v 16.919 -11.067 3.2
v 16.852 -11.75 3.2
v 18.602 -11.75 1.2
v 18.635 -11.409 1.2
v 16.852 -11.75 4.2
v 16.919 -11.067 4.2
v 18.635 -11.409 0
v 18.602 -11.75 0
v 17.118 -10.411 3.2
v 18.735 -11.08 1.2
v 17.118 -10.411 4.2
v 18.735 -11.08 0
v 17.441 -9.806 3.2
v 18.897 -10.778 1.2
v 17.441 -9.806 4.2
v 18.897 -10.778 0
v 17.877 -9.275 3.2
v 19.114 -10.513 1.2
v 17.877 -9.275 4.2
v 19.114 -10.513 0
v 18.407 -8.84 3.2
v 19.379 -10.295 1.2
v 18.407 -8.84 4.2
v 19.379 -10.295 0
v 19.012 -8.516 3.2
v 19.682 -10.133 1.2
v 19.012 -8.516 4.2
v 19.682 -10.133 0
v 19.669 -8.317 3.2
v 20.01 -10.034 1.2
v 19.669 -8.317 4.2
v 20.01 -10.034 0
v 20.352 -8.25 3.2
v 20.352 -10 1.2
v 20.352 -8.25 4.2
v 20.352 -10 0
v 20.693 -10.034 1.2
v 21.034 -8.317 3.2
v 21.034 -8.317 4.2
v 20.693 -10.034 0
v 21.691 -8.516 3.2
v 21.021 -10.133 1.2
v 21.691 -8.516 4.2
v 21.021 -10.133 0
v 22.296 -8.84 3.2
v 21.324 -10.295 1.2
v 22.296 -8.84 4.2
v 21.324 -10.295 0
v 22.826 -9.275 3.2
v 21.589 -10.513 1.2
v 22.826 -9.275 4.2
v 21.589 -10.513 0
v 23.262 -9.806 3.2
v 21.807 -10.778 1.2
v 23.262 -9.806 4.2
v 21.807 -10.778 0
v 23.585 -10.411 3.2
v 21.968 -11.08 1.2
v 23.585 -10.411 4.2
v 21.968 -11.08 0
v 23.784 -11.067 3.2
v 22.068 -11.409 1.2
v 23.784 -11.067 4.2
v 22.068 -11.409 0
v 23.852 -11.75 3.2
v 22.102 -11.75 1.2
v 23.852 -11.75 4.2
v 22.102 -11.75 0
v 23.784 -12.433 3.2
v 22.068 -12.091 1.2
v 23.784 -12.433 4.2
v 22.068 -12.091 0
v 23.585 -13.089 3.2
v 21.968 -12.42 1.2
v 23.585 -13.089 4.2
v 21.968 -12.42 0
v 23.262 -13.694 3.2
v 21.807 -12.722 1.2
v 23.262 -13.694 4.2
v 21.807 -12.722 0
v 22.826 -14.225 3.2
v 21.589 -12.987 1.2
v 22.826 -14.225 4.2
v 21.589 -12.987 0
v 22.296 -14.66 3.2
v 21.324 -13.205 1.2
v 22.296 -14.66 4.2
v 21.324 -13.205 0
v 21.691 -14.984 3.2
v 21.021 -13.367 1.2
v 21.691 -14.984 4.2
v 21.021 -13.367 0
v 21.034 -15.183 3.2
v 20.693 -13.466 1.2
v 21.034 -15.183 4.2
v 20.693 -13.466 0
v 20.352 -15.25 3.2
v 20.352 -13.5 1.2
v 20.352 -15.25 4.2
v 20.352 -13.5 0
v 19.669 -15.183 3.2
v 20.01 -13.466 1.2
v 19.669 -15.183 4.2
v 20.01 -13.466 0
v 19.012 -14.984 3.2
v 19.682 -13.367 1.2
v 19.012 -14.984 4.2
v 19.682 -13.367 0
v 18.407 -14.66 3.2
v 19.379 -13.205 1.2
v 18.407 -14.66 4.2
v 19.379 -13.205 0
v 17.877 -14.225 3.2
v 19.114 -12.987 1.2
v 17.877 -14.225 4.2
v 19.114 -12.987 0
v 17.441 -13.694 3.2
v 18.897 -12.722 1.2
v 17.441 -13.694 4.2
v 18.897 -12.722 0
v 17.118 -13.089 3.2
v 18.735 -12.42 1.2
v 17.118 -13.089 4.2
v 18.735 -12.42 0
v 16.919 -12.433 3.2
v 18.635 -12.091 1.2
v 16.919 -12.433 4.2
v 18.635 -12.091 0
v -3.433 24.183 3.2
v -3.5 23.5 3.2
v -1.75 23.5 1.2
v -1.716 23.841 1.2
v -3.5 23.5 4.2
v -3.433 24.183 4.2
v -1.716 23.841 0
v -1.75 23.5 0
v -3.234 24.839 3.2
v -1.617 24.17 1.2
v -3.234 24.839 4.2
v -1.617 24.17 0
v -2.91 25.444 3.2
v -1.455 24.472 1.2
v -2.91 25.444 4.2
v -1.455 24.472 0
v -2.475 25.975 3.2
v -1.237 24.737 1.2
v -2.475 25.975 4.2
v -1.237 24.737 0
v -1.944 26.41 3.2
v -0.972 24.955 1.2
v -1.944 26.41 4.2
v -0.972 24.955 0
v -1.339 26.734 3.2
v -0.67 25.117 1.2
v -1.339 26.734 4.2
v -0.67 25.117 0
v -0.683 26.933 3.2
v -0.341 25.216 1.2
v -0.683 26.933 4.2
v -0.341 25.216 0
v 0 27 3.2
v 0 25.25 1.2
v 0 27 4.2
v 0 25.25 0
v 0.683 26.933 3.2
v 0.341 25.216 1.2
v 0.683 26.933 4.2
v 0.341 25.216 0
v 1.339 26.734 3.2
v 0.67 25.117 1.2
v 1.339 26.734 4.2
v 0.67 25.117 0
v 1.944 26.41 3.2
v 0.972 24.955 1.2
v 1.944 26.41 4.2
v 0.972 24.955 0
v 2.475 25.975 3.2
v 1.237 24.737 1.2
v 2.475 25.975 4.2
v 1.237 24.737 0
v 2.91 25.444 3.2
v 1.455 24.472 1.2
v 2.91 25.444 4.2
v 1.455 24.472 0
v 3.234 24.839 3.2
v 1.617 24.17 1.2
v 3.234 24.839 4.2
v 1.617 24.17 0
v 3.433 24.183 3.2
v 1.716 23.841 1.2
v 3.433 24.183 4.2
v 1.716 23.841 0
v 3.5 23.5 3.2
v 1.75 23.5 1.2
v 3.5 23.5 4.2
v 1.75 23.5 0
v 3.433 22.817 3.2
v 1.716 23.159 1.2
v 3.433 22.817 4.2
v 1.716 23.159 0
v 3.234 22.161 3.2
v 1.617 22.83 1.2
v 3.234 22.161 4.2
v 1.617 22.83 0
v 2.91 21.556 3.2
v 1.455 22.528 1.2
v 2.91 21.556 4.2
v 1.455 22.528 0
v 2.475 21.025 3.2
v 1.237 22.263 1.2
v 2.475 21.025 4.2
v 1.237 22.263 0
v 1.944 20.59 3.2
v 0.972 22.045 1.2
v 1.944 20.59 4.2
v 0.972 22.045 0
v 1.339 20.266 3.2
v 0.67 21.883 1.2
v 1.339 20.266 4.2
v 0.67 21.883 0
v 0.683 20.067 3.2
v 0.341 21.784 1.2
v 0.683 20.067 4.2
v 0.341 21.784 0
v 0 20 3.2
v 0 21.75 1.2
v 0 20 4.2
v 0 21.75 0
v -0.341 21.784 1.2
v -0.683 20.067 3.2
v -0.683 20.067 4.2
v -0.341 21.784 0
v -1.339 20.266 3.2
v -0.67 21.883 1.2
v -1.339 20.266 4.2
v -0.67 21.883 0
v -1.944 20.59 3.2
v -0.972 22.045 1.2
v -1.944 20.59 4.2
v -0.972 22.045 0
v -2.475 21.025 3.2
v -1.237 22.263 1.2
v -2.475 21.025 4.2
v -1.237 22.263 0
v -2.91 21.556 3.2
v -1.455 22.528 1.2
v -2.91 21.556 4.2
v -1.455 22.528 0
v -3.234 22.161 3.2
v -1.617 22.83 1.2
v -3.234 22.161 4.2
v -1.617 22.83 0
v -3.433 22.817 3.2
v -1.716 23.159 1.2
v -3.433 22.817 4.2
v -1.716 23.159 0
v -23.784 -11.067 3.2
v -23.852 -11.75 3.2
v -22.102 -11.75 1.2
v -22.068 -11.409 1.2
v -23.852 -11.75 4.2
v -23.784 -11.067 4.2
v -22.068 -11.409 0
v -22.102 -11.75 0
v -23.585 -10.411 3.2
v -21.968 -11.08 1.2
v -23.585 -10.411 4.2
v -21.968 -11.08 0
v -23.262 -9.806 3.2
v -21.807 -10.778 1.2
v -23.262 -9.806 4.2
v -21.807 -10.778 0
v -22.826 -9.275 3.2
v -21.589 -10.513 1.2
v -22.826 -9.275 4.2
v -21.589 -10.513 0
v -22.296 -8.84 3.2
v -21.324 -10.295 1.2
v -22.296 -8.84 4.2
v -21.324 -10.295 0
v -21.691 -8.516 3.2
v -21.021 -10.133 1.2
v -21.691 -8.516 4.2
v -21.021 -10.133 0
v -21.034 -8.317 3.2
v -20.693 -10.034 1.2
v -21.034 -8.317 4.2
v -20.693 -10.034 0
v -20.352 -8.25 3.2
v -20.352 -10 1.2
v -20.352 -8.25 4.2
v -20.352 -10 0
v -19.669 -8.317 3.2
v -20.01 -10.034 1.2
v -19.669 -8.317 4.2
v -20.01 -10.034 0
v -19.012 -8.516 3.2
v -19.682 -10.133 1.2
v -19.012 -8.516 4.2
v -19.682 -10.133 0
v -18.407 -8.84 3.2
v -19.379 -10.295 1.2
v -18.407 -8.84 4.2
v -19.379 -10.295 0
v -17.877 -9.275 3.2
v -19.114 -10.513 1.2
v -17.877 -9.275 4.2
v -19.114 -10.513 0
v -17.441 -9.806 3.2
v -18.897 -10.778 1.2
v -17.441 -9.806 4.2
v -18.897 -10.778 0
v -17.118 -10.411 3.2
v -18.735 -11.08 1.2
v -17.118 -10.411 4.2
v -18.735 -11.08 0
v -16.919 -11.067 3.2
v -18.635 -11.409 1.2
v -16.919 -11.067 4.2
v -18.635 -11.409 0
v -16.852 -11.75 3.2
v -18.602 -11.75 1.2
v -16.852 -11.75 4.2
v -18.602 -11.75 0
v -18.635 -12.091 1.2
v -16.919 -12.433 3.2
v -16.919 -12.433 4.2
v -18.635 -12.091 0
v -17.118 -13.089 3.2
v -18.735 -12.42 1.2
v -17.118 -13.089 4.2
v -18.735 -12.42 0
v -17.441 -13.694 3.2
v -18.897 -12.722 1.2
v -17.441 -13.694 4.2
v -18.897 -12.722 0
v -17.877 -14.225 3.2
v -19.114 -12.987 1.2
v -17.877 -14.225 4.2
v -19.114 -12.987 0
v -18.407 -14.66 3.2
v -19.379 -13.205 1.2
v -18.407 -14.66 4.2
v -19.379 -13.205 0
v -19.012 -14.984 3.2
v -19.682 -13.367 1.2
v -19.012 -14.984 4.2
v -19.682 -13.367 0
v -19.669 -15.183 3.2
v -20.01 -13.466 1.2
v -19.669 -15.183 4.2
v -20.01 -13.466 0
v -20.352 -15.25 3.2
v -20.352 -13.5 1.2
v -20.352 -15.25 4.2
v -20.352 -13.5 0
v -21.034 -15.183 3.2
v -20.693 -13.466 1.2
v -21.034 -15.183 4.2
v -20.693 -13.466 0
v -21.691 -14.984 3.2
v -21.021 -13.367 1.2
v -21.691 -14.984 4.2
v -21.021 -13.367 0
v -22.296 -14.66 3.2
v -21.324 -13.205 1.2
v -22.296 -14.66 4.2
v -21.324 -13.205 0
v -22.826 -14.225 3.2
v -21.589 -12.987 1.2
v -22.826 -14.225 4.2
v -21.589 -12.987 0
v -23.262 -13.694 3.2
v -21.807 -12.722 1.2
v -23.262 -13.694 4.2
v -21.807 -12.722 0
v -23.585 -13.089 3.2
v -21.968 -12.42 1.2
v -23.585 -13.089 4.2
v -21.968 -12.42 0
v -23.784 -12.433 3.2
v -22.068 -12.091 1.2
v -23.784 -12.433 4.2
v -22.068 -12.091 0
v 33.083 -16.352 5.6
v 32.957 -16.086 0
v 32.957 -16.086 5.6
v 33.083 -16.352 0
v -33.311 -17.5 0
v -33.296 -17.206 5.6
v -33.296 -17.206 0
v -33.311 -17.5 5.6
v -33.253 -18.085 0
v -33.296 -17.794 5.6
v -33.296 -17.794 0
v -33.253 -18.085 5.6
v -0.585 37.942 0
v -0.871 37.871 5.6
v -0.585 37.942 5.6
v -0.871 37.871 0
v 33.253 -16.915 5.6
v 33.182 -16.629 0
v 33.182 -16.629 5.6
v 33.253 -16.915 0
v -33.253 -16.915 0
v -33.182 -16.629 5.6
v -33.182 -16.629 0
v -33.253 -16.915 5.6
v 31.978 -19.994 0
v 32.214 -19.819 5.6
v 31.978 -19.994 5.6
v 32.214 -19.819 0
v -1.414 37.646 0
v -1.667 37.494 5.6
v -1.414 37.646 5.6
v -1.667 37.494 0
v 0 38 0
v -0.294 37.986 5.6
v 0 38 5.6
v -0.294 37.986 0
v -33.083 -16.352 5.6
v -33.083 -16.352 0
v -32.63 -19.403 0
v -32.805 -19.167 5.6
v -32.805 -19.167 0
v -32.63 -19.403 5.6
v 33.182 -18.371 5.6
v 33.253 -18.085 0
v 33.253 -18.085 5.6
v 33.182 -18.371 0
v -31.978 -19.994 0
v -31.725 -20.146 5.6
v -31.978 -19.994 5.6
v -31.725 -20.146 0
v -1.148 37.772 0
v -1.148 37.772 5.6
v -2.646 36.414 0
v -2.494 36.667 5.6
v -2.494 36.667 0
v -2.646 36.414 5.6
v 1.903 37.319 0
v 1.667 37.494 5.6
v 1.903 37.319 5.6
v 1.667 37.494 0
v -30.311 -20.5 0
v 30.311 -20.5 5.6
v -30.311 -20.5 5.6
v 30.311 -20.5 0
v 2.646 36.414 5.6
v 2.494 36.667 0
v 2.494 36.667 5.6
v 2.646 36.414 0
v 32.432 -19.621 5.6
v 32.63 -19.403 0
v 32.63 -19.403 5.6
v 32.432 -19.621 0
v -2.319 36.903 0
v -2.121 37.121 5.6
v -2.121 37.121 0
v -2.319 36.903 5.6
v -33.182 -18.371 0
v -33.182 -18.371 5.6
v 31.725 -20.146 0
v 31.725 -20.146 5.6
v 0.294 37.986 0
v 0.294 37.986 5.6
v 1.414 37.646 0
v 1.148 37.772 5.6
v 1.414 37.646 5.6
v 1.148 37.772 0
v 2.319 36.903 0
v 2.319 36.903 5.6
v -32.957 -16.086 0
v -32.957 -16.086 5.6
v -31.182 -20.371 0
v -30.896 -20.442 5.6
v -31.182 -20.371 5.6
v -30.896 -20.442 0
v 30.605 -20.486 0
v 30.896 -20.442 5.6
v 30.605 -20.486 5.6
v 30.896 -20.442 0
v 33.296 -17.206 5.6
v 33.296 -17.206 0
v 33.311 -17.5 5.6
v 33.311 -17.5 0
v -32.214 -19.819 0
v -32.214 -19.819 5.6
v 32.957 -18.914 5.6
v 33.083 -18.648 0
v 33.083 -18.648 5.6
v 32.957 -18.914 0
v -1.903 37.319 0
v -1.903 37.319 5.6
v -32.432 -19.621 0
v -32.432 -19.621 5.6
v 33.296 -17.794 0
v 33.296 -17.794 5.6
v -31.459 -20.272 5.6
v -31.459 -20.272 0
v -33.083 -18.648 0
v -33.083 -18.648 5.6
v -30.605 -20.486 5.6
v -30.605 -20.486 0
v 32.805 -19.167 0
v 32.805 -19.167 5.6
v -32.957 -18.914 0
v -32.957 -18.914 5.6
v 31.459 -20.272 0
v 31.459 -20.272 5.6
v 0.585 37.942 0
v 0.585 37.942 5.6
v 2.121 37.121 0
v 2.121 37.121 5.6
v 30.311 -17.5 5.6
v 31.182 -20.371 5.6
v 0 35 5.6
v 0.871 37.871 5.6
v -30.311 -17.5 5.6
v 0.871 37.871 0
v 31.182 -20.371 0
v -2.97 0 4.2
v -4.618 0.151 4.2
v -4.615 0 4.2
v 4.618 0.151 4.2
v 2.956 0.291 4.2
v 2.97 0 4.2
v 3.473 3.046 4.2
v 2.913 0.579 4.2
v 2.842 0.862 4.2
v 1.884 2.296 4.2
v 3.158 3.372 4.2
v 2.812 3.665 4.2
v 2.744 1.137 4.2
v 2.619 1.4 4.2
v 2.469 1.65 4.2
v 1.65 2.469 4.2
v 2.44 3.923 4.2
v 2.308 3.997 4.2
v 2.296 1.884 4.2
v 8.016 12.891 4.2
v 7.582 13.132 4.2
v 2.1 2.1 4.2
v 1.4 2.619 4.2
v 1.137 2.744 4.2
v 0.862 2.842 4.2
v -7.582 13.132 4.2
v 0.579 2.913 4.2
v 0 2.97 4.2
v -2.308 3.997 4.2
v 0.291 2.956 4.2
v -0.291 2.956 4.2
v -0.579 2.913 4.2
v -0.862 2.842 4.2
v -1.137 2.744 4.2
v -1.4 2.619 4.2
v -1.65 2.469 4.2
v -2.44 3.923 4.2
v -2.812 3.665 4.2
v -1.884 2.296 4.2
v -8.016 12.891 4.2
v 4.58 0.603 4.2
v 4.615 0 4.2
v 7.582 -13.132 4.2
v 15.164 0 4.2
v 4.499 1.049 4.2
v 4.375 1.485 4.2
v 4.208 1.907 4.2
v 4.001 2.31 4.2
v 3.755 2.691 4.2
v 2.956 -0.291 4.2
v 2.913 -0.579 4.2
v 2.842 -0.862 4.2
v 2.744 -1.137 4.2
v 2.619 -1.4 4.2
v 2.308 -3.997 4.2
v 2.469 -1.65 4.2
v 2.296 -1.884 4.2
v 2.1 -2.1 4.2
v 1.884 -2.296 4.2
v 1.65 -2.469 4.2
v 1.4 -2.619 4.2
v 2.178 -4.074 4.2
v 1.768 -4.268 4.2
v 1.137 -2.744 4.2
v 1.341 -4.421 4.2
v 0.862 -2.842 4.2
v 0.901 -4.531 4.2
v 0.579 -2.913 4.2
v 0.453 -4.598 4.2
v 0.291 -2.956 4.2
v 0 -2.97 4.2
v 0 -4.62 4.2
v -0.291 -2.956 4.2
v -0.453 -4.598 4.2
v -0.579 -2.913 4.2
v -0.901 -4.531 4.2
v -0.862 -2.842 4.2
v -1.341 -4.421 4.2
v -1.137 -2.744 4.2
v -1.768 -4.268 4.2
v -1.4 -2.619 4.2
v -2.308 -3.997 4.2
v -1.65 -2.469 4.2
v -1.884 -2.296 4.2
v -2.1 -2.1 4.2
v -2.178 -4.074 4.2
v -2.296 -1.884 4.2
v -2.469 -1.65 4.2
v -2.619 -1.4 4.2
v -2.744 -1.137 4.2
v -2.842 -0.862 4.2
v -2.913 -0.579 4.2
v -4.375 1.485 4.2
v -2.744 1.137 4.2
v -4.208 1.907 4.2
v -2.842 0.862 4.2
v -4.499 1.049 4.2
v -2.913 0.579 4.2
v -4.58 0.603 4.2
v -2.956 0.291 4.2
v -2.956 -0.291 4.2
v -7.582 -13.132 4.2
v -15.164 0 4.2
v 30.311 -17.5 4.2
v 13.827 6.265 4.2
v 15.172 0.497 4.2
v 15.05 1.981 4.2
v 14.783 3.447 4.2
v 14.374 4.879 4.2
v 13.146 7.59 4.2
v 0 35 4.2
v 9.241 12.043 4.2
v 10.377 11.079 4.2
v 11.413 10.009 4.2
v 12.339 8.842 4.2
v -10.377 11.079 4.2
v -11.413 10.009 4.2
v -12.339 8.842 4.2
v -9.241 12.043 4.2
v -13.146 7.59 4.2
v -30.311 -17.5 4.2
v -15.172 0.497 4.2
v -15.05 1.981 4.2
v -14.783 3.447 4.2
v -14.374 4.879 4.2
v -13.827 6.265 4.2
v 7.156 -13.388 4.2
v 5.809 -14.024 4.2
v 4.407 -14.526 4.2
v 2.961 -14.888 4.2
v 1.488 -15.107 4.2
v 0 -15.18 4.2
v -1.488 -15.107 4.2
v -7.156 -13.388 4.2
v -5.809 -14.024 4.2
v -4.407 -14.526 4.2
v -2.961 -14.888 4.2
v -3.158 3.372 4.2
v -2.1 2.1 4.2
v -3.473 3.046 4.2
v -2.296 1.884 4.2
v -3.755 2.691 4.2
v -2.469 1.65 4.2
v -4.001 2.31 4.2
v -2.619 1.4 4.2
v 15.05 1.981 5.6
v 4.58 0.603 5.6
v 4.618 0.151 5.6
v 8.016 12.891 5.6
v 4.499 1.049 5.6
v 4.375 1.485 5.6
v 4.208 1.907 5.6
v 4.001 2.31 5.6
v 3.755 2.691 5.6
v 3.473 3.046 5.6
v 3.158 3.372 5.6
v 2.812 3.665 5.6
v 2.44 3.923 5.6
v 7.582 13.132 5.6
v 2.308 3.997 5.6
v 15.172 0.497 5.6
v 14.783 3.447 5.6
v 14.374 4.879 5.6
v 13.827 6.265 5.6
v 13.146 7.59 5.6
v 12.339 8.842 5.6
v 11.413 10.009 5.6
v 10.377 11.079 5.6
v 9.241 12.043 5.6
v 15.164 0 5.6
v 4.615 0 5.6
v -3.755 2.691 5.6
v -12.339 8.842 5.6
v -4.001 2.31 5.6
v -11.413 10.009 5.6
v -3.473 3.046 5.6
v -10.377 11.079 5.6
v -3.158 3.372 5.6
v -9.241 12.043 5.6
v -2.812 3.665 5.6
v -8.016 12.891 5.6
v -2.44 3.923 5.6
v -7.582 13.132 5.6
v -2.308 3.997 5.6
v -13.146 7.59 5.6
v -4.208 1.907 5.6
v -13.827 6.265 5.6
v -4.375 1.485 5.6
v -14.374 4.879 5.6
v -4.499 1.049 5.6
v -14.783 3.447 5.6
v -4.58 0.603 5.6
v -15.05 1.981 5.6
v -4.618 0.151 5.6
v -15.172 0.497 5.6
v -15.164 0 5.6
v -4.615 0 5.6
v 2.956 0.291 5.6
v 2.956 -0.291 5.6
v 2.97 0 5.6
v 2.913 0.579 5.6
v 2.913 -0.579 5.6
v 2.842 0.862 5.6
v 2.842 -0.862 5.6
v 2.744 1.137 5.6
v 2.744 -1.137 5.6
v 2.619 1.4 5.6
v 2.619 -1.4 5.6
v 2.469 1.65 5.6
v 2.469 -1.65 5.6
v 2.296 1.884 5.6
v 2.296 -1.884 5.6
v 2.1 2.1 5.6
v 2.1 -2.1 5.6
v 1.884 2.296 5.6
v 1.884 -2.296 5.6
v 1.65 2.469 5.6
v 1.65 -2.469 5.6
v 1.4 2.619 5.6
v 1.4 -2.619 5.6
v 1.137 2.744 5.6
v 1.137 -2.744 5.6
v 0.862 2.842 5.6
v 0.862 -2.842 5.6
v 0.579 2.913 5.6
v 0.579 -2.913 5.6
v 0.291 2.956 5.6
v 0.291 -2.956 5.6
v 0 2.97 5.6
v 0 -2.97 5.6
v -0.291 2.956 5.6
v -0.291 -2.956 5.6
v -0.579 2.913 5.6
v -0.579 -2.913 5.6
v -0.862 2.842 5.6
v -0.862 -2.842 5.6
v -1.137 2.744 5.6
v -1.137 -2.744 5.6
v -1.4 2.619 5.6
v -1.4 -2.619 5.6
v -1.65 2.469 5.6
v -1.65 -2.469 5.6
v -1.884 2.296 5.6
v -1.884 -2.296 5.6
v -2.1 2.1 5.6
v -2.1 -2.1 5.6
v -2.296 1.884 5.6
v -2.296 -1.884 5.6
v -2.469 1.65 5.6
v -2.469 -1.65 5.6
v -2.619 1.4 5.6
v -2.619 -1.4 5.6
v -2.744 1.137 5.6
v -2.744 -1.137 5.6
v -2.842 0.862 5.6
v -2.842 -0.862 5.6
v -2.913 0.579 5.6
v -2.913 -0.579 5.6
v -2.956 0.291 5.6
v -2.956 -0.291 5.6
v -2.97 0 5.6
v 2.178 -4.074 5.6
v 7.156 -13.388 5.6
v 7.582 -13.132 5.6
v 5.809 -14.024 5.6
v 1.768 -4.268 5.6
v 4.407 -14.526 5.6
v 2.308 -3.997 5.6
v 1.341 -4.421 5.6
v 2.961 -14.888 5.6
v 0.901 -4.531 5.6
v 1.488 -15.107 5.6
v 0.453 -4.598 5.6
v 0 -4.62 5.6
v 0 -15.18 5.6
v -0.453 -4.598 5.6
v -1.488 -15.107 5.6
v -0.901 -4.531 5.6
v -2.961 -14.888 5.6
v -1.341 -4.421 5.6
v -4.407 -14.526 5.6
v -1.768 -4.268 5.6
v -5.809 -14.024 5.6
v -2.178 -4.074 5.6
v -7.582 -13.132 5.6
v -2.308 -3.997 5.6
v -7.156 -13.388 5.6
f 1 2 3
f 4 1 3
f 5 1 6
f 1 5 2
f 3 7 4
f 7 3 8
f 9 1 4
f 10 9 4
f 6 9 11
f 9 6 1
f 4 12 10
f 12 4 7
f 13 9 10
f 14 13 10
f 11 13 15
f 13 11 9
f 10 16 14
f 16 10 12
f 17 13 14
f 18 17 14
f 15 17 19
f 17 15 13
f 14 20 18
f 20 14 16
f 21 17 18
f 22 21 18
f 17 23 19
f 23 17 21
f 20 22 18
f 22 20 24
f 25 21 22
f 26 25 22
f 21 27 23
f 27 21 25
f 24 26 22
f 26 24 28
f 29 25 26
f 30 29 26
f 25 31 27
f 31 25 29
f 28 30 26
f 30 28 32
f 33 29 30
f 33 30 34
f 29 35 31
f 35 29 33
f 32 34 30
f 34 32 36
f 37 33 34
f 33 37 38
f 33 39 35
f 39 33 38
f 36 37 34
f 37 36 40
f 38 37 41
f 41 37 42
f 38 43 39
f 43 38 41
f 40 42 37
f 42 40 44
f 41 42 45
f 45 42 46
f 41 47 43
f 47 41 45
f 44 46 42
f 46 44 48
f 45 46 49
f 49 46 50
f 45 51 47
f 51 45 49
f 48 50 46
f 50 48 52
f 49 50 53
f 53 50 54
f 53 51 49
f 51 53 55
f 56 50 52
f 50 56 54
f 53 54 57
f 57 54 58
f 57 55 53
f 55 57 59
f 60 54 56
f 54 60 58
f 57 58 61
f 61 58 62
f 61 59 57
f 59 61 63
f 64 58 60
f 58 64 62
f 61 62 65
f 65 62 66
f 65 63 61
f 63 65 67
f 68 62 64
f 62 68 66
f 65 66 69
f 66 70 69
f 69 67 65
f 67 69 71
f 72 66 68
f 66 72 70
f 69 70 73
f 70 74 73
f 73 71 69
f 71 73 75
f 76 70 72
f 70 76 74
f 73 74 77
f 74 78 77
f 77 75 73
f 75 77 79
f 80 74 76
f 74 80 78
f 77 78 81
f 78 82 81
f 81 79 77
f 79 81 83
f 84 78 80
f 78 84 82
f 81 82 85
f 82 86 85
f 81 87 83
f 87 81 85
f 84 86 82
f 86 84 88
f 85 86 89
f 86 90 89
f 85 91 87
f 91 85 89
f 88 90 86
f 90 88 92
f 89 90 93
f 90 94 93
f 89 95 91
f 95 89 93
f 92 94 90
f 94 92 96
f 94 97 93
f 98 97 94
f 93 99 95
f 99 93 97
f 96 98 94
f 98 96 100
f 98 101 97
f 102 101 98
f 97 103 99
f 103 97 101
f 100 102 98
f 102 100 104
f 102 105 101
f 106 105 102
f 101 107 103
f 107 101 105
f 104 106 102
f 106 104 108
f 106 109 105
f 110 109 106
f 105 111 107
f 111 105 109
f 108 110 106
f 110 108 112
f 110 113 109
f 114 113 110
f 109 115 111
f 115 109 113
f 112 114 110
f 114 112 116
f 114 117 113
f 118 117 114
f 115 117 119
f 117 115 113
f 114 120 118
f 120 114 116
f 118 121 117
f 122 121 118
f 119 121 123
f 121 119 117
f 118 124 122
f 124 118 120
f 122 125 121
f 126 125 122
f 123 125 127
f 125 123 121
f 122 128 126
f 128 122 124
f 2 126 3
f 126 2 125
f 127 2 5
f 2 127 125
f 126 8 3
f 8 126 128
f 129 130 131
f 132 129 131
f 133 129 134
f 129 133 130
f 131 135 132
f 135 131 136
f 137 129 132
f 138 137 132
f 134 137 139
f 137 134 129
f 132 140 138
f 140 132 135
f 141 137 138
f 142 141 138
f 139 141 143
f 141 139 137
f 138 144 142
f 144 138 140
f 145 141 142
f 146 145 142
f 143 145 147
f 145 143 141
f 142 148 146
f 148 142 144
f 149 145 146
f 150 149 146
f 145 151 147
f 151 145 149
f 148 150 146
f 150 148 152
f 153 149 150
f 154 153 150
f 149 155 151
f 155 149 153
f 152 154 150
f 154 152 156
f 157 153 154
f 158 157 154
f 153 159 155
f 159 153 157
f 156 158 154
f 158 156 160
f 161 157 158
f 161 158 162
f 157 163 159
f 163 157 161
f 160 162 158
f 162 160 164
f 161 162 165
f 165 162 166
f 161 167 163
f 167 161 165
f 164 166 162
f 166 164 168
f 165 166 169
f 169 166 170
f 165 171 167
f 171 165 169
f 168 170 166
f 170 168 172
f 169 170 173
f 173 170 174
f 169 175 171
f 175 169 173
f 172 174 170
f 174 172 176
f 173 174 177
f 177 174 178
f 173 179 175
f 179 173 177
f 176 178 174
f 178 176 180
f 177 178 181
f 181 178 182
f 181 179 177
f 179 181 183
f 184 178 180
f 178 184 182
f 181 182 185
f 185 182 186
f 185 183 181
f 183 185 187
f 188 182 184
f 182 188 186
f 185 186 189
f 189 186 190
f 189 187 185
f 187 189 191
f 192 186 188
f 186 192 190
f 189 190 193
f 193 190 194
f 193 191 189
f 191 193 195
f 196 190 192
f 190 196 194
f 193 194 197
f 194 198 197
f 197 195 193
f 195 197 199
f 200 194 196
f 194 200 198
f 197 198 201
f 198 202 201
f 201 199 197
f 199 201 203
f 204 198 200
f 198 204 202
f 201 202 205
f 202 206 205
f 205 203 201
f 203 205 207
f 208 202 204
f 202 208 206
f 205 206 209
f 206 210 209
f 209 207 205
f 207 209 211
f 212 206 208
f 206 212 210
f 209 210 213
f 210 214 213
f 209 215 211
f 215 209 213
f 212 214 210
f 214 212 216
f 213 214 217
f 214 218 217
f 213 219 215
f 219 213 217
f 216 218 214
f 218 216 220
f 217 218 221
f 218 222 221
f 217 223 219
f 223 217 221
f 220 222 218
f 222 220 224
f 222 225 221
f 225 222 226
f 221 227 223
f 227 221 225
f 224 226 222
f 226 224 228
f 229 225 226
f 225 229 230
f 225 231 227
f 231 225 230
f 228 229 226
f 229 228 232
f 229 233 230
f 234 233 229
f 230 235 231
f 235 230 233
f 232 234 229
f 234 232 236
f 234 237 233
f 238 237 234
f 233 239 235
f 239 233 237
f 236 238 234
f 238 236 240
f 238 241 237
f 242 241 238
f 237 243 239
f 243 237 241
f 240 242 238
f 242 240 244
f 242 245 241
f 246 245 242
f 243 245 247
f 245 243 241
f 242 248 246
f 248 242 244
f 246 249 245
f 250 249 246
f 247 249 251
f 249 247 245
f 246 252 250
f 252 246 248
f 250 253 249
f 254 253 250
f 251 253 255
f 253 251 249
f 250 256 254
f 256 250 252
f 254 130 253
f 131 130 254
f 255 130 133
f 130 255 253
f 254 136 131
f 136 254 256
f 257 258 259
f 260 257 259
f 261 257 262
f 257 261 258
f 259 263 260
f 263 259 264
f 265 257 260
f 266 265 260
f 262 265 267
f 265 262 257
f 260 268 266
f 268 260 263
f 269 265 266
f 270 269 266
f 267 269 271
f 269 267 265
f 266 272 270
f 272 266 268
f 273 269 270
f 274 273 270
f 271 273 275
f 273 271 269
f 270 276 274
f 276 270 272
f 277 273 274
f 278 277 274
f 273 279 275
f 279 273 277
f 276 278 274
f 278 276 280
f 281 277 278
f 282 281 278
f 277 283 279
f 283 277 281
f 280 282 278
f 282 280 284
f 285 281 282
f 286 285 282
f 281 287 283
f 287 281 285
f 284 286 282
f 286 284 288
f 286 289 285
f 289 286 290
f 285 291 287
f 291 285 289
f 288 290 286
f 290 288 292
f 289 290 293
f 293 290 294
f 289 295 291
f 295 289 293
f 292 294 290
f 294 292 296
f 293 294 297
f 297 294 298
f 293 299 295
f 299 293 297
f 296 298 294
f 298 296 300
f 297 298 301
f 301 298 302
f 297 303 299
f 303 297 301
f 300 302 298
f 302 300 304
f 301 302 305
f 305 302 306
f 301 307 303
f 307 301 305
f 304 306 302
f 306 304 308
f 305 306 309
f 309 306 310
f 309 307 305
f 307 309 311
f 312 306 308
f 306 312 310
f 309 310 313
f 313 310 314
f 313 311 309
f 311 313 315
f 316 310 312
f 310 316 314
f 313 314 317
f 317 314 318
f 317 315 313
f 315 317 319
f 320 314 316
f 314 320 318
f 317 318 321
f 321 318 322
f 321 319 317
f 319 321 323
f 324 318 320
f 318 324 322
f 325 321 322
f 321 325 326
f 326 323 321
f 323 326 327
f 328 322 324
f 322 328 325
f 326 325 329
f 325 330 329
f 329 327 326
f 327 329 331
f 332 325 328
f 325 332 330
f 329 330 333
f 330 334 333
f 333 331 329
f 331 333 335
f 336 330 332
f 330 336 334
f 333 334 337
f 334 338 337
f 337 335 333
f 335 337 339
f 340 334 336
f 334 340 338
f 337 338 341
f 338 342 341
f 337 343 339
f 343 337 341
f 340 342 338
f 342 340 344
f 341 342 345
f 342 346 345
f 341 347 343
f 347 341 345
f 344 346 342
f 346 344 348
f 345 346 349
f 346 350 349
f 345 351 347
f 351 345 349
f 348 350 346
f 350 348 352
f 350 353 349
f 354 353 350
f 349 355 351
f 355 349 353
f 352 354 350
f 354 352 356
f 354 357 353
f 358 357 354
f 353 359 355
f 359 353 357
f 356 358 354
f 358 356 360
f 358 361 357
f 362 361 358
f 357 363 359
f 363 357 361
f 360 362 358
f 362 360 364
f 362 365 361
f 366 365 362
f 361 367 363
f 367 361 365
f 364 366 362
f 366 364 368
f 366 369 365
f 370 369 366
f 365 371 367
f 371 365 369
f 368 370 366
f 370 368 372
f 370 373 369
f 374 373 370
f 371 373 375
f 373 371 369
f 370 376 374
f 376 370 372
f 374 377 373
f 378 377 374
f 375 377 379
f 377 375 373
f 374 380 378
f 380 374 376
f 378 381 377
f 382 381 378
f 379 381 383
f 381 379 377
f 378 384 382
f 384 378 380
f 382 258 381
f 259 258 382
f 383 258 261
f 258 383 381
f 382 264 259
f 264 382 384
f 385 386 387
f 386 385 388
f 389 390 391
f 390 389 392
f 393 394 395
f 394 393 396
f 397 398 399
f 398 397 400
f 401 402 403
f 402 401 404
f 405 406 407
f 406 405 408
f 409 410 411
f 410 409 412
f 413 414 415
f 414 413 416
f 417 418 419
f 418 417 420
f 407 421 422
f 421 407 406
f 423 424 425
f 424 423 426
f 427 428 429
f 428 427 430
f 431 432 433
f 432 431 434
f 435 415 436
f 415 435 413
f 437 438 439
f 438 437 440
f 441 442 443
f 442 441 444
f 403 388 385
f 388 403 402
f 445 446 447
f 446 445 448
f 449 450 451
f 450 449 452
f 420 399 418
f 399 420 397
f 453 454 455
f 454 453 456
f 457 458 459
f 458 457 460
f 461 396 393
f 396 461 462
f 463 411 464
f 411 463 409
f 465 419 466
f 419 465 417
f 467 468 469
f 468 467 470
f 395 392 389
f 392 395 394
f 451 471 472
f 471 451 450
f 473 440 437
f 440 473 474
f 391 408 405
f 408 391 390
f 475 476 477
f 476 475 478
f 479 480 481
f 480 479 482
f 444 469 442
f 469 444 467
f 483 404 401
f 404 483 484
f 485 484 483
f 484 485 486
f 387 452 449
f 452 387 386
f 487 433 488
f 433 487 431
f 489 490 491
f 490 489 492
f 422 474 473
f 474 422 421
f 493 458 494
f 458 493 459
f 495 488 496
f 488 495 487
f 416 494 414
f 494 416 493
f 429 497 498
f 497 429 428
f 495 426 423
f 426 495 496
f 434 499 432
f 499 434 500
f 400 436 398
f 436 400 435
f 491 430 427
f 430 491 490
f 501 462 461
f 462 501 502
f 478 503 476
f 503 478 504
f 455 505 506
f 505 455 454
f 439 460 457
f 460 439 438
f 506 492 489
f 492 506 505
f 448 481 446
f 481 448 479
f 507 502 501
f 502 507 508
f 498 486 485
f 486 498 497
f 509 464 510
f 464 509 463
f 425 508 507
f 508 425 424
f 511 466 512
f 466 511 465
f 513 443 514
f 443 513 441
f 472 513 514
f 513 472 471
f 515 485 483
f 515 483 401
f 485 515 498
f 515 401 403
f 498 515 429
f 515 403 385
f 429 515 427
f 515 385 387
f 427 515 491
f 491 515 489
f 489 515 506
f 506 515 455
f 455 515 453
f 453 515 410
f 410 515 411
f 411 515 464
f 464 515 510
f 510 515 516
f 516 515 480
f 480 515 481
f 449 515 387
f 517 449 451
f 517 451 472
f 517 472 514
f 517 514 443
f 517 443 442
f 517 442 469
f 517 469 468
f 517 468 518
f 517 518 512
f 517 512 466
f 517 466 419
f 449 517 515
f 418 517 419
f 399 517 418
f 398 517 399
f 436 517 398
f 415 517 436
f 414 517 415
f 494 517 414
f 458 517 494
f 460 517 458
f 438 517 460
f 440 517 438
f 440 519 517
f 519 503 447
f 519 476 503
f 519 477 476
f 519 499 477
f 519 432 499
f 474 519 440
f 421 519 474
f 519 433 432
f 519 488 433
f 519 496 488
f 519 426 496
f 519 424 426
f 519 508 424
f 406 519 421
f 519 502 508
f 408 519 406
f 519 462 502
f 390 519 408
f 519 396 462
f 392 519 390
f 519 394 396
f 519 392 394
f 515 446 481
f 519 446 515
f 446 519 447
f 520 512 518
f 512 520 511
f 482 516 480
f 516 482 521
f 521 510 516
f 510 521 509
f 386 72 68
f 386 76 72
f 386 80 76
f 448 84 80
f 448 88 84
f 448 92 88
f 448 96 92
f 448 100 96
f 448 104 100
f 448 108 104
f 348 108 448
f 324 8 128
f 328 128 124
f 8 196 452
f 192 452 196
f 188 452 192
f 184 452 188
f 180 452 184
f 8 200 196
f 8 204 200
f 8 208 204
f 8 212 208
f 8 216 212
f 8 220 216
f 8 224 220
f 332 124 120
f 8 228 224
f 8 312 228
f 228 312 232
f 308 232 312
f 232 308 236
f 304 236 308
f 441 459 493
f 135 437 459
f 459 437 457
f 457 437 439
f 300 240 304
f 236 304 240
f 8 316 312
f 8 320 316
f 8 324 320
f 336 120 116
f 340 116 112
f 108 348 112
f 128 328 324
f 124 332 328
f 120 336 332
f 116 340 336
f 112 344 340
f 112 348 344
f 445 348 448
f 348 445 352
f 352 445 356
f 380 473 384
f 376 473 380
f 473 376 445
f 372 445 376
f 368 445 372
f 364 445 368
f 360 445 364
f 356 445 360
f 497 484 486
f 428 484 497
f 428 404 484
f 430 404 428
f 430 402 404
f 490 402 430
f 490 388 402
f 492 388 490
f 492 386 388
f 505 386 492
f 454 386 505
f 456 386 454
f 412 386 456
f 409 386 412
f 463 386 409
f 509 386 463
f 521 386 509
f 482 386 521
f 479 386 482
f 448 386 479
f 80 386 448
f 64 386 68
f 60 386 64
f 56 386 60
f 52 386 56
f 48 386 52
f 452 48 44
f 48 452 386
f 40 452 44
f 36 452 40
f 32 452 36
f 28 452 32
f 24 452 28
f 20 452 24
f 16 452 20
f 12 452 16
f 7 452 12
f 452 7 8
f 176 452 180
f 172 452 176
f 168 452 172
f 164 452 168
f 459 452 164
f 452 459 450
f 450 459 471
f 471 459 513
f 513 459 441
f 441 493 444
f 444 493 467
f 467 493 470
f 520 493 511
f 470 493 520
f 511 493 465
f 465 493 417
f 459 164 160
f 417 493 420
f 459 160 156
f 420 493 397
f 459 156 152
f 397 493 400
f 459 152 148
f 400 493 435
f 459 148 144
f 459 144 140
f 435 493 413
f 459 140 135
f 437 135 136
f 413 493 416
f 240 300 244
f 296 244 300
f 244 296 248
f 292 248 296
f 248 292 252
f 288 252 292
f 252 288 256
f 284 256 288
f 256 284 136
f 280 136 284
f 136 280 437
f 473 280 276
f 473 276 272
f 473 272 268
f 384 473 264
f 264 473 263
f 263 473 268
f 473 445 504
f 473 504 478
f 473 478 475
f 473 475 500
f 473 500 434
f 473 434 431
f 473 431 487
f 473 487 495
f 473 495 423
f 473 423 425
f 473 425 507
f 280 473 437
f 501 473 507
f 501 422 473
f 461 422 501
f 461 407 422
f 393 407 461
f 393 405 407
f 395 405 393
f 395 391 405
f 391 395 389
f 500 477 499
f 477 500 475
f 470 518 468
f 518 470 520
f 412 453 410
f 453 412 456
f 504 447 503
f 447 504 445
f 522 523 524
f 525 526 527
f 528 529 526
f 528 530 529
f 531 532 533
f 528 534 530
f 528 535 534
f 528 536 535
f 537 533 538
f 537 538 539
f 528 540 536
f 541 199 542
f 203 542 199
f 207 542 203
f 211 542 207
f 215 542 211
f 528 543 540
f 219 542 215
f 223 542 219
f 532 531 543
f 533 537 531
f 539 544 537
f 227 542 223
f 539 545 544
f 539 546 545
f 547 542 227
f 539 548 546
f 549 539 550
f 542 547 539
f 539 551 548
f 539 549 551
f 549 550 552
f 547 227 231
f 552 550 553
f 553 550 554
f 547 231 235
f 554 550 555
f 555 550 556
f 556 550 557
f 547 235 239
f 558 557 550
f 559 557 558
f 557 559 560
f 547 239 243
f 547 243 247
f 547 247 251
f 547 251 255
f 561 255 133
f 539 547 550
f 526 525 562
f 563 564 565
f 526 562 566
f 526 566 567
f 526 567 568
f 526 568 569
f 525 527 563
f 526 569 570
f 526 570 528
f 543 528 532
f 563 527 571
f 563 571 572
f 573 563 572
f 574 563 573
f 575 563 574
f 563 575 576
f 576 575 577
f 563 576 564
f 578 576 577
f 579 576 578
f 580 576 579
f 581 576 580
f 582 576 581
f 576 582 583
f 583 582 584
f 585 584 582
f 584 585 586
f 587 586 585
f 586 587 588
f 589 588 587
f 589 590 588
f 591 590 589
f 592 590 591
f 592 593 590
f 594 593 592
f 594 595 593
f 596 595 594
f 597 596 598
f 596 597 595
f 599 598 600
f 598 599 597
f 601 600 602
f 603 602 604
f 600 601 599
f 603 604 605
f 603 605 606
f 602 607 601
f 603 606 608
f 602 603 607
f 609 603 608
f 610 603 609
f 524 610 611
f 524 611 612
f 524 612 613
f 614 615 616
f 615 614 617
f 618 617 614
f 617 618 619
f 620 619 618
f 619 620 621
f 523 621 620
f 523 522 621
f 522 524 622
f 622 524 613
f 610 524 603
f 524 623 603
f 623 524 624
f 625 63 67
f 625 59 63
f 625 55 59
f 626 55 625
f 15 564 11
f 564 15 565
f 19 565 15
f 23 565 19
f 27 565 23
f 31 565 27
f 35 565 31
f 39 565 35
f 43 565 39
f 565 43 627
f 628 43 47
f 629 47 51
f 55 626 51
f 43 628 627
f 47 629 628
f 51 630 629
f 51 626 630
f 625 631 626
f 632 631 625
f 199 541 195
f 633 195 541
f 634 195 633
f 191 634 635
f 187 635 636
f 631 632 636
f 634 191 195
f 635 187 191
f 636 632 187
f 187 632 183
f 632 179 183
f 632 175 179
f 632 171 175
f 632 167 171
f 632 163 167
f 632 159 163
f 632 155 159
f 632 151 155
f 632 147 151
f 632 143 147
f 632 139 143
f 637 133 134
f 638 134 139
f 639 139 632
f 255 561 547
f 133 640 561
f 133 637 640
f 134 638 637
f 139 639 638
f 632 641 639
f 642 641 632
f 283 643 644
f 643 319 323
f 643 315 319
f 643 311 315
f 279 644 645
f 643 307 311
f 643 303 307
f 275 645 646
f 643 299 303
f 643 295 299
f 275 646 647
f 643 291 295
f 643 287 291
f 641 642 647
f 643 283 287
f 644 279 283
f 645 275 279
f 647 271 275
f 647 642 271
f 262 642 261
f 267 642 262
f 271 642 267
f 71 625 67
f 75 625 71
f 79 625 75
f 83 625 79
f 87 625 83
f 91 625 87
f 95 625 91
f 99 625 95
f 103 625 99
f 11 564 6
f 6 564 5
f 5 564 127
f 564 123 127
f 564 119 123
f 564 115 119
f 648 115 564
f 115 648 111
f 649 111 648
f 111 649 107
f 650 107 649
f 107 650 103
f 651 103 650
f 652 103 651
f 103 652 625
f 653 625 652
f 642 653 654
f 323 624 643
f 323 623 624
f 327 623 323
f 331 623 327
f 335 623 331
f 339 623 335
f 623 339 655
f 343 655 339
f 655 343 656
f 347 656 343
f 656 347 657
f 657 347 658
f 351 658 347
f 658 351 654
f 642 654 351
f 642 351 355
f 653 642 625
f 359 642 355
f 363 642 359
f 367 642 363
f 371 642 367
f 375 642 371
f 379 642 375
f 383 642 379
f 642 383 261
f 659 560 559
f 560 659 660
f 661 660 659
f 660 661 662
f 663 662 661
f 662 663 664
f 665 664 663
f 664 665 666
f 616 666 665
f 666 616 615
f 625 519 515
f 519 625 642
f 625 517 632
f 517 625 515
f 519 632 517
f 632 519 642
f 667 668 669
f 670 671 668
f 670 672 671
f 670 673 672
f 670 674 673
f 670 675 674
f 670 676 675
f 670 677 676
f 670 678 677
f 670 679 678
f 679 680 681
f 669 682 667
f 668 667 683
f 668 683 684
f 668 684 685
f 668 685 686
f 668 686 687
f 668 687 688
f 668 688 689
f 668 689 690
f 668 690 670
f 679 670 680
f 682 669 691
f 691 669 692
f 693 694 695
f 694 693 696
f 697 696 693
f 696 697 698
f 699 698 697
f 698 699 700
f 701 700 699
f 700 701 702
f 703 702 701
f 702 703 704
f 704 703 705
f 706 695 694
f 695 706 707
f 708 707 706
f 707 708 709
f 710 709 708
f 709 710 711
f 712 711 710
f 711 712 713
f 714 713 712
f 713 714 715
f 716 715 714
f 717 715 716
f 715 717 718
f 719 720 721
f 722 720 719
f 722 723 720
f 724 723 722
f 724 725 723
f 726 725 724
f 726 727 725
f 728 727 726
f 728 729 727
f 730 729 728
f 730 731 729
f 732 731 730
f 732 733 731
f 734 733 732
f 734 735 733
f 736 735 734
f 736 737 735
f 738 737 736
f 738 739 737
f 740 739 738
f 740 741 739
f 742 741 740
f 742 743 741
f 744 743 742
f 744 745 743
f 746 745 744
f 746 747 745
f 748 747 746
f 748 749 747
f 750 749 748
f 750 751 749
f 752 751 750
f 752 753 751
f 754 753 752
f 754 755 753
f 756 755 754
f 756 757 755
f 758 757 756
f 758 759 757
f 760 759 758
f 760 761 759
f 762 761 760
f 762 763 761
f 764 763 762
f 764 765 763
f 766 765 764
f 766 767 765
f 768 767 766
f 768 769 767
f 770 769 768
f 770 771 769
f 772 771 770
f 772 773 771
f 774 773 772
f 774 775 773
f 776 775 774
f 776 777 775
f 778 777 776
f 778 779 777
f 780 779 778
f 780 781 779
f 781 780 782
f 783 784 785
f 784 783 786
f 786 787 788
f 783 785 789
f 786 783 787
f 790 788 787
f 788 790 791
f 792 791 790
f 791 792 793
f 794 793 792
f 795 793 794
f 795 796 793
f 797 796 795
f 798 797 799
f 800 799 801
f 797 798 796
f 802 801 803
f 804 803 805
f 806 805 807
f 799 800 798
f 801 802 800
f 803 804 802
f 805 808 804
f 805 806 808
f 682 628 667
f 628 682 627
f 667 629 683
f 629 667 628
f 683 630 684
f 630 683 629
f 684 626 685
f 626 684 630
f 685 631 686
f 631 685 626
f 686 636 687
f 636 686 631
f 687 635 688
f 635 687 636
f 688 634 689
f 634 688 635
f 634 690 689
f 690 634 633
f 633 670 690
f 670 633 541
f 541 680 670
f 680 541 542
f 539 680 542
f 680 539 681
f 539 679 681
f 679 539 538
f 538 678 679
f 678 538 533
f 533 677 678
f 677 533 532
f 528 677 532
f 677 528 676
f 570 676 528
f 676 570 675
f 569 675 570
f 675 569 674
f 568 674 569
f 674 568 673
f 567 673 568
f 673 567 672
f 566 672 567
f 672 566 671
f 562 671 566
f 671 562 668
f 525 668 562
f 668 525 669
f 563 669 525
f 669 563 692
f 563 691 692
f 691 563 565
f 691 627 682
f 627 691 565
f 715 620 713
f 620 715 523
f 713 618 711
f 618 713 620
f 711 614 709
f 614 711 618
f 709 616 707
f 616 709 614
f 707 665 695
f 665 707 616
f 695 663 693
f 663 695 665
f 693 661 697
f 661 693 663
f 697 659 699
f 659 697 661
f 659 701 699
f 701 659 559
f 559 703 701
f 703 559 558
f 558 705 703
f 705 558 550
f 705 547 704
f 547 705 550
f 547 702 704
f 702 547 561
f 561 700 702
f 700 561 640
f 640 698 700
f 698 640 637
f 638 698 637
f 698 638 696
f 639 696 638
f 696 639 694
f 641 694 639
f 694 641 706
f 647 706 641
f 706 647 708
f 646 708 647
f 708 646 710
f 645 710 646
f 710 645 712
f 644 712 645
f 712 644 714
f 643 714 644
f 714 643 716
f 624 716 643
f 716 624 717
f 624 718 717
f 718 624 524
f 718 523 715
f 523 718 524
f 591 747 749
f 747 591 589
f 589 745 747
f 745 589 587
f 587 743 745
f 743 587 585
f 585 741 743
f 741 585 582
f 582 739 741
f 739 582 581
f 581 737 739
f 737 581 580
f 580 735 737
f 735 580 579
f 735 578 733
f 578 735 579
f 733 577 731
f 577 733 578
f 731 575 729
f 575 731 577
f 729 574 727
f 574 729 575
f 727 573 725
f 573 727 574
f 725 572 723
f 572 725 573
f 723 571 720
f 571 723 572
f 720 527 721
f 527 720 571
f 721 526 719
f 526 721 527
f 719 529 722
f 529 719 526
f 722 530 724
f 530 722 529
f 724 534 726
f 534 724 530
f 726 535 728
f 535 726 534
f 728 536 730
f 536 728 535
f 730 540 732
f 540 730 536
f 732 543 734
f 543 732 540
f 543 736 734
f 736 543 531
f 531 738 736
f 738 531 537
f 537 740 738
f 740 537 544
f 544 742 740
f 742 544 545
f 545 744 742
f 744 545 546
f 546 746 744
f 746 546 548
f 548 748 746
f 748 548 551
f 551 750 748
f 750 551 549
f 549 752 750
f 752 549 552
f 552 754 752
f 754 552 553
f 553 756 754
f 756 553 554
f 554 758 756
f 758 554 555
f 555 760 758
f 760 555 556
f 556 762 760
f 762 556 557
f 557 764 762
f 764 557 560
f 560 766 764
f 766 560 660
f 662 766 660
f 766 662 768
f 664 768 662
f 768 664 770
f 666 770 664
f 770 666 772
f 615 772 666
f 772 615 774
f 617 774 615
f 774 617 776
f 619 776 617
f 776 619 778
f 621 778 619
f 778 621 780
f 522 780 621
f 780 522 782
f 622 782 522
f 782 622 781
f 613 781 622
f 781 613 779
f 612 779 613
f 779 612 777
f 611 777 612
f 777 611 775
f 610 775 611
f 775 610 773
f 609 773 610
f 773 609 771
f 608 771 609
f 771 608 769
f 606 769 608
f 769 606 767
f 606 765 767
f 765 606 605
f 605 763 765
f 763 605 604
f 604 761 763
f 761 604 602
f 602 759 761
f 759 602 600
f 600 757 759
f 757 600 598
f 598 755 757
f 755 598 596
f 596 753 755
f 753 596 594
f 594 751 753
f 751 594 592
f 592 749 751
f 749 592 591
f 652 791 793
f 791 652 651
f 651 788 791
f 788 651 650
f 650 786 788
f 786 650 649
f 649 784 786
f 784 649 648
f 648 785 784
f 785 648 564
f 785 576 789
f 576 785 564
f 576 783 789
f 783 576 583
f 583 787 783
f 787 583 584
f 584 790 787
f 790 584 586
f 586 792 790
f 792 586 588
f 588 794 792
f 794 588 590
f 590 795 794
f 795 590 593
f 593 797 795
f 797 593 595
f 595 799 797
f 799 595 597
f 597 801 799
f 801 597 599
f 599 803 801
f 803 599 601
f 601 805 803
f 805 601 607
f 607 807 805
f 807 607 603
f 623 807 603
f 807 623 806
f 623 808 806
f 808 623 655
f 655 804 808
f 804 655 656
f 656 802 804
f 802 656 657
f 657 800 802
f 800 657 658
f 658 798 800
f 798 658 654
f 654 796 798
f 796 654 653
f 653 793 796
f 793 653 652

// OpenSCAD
// preview[view:south, tilt:top]

// Radius of inner triangle
sign_r = 35; // [30:1:100]

// Inner thickness of sign
inner_t = 4.2; // [1:.1:10]

// Extrusion of border and symbol
extr = 1.4; // [.4:.1:5]

// Width of border
border_w = 3.0; // [1:.1:15]

// Make screw holes
use_screws = 1; // [0: False, 1:True]

// Radius of screw hole
screw_r = 1.75; // [1:.05:5]

// Radius of screw head
screw_head_r = 3.5;  // [.5:.1:5]

// Height of screw head
screw_head_h = 2; // [0:.1:5]

// Distance between screw hole and triangle corner
screw_dist = 11.5; // [1:.1:15]

// Horizontal scale of symbol
symbol_scale = 1.0; // [.5:.1:5]

// Select symbol
symbol = "rad"; // [none:None,biohaz:Biohazard, rad:Radiation, skull:Skull and bones, generic: Generic caution, custom: Heightfield bitmap (PNG)]

// Filename for custom symbol heightfield (PNG)
symbol_bitmap = ""; // [image_surface:150x150]

/* [hidden] */
border_t = inner_t+extr;
lathe = 64;
overlap = 0.1;
screw_head_ofs = 1;

// Preview colors
color_base = "gray";
color_extr = "blue";

warning_triangle();

translate([0, 0, overlap])
color(color_extr)
scale([symbol_scale, symbol_scale, 1])

if(symbol == "biohaz")
    linear_extrude(height=border_t-overlap)
    biohazard(lathe);

else if(symbol == "rad")
    linear_extrude(height=border_t-overlap)
    radiation(lathe);

else if(symbol == "skull")
    linear_extrude(height=border_t-overlap)
    skull();

else if(symbol == "generic")
    linear_extrude(height=border_t-overlap)
    generic();

else if(symbol == "custom")
    intersection() {
        difference() {
            translate([0, 0, inner_t-overlap-.01])
            scale([.25*symbol_scale, .25*symbol_scale, .01*extr])
            surface(file = symbol_bitmap, center = true);
            
            screws();
        }
        rotate(90)
        cylinder(r=sign_r, $fn=3, h=border_t+1);
    }


function triangle(r) = [
    for (i = [ 0 : 2 ]) 
        let (
            x = r * cos(120*i-30),
            y = r * sin(120*i-30)
        ) [x, y]
];

module warning_triangle() {
    corners = triangle(sign_r);

    difference() {
        color(color_extr)
        linear_extrude(height=border_t) {
            hull() {
                for(i=[0:2]) {
                    translate(corners[i])
                    circle(r=border_w, $fn=lathe);
                }
            }
        };
        
        color(color_base)
        translate([0, 0, inner_t])
        linear_extrude(height=border_t) {
            polygon(corners);
        };
        
        screws();
    }
}

module screws() {
    module screw() {
        h1=inner_t-screw_head_h-screw_head_ofs;
        h2=h1 + screw_head_h; 
        h3=border_t+50;
        
        fudge = -.001;
        rotate_extrude($fn = 32)
        polygon(points=[
            [0, fudge], 
            [screw_r, fudge],
            [screw_r, h1], 
            [screw_head_r, h2], 
            [screw_head_r, h3], 
            [0, h3]
        ]);
    }    
    
    if(use_screws) {
        screw_pos = triangle(sign_r-screw_dist);
        
        color(color_base)
        for(i=[0:2]) {
            translate(screw_pos[i])
            screw();
        }
    }
}

module radiation(fn) {
    module radiation_section() {
        difference() {            
            circle(r=46, $fn=fn);
            circle(r=14, $fn=fn);
            
            translate([-100, 0])
            square(200);
            
            rotate(90+60)
            square(100);
            
            rotate(0-60)
            square(100);
        }
    }
    
    scale(0.33) {
        for(i=[0:2])
            rotate(i*120)
            radiation_section();
        circle(9, $fn=fn);
    }
}

module skull() {
    module bone() {
        translate([0, -2])
        
        polygon(points=[
            [.5, 0],
            [7, 0],
            [7, 4],
            [-.1, 4]
        ]);
        
        translate([7, 2])
        circle(r=3, $fn=16);
        
        translate([7, -2])
        circle(r=3, $fn=16);
    }
    
    scale(.7)
    translate([0, -3]) {
        difference() {
            scale([1, .85])
            circle(15);

            // Left eye
            translate([-6, 0])
            scale([1, 1.2])
            circle(5);
            
            // Right eye
            translate([6, 0])
            scale([1, 1.2])
            circle(5);
            
            // Nose
            polygon(points=[
                [0, -4],
                [-4, -10],
                [0, -9],
                [4, -10],
            ]);
        }
        
        // Left tooth
        polygon(points=[
            [-3, -10],
            [-4.5, -18],
            [-8.5, -18],
            [-5.5, -10]
        ]);
        
        // Middle tooth
        polygon(points=[
            [1, -10],
            [2, -18],
            [-2, -18],
            [-1, -10]
        ]);
        
        // Right tooth
         polygon(points=[
            [3, -10],
            [4.5, -18],
            [8.5, -18],
            [5.5, -10]
        ]);
        
        // Bones
        rotate(35)
        translate([15, 0])
        bone();
        
        rotate(-145)
        translate([15, 0])
        bone();        
        
        mirror([1, 0, 0])
        rotate(35)
        translate([15, 0])
        bone();
        
        mirror([1, 0, 0])
        rotate(-145)
        translate([15, 0])
        bone();   
    }
}

/*
module skull() {
    text("\u2620", size=23, font="Segoe UI Symbol", 
        halign="center", valign="center");
}
*/

module generic() {
    hull() {
        translate([0, 13])
        circle(r=3.5, $fn=16);

        translate([0, -3])
        circle(r=2.5, $fn=16);
    }

    translate([0, -11])
    circle(r=2.5, $fn=16);
}

module biohazard(fn) {
    module biohazard_section(fn) {
        difference() {
            translate([0, 11])
            circle(15, $fn=fn);
            
            circle(3, $fn=fn/2);
            
            translate([0, 15])
            circle(10.5, $fn=fn);

            translate([0, 26])
            square(size=[4,4], center=true);    

            translate([0, 4])
            square(size=[1,4], center=true);

            rotate(60)
            translate([-10, -10])
            square(size=[10, 30], center=false);

            rotate(-60)
            translate([0, -10])
            square(size=[10, 30], center=false);    
        };
        
        intersection() {
            translate([0, 15])
            circle(9.5, $fn=fn);
            difference() {
                circle(13.5, $fn=fn);                
                circle(10, $fn=fn);
            }    
        } 
    }    
    
    scale(.67) {
        for(i=[0:2]) {
            rotate(i*120)
            biohazard_section(fn);
        }
    }
}
